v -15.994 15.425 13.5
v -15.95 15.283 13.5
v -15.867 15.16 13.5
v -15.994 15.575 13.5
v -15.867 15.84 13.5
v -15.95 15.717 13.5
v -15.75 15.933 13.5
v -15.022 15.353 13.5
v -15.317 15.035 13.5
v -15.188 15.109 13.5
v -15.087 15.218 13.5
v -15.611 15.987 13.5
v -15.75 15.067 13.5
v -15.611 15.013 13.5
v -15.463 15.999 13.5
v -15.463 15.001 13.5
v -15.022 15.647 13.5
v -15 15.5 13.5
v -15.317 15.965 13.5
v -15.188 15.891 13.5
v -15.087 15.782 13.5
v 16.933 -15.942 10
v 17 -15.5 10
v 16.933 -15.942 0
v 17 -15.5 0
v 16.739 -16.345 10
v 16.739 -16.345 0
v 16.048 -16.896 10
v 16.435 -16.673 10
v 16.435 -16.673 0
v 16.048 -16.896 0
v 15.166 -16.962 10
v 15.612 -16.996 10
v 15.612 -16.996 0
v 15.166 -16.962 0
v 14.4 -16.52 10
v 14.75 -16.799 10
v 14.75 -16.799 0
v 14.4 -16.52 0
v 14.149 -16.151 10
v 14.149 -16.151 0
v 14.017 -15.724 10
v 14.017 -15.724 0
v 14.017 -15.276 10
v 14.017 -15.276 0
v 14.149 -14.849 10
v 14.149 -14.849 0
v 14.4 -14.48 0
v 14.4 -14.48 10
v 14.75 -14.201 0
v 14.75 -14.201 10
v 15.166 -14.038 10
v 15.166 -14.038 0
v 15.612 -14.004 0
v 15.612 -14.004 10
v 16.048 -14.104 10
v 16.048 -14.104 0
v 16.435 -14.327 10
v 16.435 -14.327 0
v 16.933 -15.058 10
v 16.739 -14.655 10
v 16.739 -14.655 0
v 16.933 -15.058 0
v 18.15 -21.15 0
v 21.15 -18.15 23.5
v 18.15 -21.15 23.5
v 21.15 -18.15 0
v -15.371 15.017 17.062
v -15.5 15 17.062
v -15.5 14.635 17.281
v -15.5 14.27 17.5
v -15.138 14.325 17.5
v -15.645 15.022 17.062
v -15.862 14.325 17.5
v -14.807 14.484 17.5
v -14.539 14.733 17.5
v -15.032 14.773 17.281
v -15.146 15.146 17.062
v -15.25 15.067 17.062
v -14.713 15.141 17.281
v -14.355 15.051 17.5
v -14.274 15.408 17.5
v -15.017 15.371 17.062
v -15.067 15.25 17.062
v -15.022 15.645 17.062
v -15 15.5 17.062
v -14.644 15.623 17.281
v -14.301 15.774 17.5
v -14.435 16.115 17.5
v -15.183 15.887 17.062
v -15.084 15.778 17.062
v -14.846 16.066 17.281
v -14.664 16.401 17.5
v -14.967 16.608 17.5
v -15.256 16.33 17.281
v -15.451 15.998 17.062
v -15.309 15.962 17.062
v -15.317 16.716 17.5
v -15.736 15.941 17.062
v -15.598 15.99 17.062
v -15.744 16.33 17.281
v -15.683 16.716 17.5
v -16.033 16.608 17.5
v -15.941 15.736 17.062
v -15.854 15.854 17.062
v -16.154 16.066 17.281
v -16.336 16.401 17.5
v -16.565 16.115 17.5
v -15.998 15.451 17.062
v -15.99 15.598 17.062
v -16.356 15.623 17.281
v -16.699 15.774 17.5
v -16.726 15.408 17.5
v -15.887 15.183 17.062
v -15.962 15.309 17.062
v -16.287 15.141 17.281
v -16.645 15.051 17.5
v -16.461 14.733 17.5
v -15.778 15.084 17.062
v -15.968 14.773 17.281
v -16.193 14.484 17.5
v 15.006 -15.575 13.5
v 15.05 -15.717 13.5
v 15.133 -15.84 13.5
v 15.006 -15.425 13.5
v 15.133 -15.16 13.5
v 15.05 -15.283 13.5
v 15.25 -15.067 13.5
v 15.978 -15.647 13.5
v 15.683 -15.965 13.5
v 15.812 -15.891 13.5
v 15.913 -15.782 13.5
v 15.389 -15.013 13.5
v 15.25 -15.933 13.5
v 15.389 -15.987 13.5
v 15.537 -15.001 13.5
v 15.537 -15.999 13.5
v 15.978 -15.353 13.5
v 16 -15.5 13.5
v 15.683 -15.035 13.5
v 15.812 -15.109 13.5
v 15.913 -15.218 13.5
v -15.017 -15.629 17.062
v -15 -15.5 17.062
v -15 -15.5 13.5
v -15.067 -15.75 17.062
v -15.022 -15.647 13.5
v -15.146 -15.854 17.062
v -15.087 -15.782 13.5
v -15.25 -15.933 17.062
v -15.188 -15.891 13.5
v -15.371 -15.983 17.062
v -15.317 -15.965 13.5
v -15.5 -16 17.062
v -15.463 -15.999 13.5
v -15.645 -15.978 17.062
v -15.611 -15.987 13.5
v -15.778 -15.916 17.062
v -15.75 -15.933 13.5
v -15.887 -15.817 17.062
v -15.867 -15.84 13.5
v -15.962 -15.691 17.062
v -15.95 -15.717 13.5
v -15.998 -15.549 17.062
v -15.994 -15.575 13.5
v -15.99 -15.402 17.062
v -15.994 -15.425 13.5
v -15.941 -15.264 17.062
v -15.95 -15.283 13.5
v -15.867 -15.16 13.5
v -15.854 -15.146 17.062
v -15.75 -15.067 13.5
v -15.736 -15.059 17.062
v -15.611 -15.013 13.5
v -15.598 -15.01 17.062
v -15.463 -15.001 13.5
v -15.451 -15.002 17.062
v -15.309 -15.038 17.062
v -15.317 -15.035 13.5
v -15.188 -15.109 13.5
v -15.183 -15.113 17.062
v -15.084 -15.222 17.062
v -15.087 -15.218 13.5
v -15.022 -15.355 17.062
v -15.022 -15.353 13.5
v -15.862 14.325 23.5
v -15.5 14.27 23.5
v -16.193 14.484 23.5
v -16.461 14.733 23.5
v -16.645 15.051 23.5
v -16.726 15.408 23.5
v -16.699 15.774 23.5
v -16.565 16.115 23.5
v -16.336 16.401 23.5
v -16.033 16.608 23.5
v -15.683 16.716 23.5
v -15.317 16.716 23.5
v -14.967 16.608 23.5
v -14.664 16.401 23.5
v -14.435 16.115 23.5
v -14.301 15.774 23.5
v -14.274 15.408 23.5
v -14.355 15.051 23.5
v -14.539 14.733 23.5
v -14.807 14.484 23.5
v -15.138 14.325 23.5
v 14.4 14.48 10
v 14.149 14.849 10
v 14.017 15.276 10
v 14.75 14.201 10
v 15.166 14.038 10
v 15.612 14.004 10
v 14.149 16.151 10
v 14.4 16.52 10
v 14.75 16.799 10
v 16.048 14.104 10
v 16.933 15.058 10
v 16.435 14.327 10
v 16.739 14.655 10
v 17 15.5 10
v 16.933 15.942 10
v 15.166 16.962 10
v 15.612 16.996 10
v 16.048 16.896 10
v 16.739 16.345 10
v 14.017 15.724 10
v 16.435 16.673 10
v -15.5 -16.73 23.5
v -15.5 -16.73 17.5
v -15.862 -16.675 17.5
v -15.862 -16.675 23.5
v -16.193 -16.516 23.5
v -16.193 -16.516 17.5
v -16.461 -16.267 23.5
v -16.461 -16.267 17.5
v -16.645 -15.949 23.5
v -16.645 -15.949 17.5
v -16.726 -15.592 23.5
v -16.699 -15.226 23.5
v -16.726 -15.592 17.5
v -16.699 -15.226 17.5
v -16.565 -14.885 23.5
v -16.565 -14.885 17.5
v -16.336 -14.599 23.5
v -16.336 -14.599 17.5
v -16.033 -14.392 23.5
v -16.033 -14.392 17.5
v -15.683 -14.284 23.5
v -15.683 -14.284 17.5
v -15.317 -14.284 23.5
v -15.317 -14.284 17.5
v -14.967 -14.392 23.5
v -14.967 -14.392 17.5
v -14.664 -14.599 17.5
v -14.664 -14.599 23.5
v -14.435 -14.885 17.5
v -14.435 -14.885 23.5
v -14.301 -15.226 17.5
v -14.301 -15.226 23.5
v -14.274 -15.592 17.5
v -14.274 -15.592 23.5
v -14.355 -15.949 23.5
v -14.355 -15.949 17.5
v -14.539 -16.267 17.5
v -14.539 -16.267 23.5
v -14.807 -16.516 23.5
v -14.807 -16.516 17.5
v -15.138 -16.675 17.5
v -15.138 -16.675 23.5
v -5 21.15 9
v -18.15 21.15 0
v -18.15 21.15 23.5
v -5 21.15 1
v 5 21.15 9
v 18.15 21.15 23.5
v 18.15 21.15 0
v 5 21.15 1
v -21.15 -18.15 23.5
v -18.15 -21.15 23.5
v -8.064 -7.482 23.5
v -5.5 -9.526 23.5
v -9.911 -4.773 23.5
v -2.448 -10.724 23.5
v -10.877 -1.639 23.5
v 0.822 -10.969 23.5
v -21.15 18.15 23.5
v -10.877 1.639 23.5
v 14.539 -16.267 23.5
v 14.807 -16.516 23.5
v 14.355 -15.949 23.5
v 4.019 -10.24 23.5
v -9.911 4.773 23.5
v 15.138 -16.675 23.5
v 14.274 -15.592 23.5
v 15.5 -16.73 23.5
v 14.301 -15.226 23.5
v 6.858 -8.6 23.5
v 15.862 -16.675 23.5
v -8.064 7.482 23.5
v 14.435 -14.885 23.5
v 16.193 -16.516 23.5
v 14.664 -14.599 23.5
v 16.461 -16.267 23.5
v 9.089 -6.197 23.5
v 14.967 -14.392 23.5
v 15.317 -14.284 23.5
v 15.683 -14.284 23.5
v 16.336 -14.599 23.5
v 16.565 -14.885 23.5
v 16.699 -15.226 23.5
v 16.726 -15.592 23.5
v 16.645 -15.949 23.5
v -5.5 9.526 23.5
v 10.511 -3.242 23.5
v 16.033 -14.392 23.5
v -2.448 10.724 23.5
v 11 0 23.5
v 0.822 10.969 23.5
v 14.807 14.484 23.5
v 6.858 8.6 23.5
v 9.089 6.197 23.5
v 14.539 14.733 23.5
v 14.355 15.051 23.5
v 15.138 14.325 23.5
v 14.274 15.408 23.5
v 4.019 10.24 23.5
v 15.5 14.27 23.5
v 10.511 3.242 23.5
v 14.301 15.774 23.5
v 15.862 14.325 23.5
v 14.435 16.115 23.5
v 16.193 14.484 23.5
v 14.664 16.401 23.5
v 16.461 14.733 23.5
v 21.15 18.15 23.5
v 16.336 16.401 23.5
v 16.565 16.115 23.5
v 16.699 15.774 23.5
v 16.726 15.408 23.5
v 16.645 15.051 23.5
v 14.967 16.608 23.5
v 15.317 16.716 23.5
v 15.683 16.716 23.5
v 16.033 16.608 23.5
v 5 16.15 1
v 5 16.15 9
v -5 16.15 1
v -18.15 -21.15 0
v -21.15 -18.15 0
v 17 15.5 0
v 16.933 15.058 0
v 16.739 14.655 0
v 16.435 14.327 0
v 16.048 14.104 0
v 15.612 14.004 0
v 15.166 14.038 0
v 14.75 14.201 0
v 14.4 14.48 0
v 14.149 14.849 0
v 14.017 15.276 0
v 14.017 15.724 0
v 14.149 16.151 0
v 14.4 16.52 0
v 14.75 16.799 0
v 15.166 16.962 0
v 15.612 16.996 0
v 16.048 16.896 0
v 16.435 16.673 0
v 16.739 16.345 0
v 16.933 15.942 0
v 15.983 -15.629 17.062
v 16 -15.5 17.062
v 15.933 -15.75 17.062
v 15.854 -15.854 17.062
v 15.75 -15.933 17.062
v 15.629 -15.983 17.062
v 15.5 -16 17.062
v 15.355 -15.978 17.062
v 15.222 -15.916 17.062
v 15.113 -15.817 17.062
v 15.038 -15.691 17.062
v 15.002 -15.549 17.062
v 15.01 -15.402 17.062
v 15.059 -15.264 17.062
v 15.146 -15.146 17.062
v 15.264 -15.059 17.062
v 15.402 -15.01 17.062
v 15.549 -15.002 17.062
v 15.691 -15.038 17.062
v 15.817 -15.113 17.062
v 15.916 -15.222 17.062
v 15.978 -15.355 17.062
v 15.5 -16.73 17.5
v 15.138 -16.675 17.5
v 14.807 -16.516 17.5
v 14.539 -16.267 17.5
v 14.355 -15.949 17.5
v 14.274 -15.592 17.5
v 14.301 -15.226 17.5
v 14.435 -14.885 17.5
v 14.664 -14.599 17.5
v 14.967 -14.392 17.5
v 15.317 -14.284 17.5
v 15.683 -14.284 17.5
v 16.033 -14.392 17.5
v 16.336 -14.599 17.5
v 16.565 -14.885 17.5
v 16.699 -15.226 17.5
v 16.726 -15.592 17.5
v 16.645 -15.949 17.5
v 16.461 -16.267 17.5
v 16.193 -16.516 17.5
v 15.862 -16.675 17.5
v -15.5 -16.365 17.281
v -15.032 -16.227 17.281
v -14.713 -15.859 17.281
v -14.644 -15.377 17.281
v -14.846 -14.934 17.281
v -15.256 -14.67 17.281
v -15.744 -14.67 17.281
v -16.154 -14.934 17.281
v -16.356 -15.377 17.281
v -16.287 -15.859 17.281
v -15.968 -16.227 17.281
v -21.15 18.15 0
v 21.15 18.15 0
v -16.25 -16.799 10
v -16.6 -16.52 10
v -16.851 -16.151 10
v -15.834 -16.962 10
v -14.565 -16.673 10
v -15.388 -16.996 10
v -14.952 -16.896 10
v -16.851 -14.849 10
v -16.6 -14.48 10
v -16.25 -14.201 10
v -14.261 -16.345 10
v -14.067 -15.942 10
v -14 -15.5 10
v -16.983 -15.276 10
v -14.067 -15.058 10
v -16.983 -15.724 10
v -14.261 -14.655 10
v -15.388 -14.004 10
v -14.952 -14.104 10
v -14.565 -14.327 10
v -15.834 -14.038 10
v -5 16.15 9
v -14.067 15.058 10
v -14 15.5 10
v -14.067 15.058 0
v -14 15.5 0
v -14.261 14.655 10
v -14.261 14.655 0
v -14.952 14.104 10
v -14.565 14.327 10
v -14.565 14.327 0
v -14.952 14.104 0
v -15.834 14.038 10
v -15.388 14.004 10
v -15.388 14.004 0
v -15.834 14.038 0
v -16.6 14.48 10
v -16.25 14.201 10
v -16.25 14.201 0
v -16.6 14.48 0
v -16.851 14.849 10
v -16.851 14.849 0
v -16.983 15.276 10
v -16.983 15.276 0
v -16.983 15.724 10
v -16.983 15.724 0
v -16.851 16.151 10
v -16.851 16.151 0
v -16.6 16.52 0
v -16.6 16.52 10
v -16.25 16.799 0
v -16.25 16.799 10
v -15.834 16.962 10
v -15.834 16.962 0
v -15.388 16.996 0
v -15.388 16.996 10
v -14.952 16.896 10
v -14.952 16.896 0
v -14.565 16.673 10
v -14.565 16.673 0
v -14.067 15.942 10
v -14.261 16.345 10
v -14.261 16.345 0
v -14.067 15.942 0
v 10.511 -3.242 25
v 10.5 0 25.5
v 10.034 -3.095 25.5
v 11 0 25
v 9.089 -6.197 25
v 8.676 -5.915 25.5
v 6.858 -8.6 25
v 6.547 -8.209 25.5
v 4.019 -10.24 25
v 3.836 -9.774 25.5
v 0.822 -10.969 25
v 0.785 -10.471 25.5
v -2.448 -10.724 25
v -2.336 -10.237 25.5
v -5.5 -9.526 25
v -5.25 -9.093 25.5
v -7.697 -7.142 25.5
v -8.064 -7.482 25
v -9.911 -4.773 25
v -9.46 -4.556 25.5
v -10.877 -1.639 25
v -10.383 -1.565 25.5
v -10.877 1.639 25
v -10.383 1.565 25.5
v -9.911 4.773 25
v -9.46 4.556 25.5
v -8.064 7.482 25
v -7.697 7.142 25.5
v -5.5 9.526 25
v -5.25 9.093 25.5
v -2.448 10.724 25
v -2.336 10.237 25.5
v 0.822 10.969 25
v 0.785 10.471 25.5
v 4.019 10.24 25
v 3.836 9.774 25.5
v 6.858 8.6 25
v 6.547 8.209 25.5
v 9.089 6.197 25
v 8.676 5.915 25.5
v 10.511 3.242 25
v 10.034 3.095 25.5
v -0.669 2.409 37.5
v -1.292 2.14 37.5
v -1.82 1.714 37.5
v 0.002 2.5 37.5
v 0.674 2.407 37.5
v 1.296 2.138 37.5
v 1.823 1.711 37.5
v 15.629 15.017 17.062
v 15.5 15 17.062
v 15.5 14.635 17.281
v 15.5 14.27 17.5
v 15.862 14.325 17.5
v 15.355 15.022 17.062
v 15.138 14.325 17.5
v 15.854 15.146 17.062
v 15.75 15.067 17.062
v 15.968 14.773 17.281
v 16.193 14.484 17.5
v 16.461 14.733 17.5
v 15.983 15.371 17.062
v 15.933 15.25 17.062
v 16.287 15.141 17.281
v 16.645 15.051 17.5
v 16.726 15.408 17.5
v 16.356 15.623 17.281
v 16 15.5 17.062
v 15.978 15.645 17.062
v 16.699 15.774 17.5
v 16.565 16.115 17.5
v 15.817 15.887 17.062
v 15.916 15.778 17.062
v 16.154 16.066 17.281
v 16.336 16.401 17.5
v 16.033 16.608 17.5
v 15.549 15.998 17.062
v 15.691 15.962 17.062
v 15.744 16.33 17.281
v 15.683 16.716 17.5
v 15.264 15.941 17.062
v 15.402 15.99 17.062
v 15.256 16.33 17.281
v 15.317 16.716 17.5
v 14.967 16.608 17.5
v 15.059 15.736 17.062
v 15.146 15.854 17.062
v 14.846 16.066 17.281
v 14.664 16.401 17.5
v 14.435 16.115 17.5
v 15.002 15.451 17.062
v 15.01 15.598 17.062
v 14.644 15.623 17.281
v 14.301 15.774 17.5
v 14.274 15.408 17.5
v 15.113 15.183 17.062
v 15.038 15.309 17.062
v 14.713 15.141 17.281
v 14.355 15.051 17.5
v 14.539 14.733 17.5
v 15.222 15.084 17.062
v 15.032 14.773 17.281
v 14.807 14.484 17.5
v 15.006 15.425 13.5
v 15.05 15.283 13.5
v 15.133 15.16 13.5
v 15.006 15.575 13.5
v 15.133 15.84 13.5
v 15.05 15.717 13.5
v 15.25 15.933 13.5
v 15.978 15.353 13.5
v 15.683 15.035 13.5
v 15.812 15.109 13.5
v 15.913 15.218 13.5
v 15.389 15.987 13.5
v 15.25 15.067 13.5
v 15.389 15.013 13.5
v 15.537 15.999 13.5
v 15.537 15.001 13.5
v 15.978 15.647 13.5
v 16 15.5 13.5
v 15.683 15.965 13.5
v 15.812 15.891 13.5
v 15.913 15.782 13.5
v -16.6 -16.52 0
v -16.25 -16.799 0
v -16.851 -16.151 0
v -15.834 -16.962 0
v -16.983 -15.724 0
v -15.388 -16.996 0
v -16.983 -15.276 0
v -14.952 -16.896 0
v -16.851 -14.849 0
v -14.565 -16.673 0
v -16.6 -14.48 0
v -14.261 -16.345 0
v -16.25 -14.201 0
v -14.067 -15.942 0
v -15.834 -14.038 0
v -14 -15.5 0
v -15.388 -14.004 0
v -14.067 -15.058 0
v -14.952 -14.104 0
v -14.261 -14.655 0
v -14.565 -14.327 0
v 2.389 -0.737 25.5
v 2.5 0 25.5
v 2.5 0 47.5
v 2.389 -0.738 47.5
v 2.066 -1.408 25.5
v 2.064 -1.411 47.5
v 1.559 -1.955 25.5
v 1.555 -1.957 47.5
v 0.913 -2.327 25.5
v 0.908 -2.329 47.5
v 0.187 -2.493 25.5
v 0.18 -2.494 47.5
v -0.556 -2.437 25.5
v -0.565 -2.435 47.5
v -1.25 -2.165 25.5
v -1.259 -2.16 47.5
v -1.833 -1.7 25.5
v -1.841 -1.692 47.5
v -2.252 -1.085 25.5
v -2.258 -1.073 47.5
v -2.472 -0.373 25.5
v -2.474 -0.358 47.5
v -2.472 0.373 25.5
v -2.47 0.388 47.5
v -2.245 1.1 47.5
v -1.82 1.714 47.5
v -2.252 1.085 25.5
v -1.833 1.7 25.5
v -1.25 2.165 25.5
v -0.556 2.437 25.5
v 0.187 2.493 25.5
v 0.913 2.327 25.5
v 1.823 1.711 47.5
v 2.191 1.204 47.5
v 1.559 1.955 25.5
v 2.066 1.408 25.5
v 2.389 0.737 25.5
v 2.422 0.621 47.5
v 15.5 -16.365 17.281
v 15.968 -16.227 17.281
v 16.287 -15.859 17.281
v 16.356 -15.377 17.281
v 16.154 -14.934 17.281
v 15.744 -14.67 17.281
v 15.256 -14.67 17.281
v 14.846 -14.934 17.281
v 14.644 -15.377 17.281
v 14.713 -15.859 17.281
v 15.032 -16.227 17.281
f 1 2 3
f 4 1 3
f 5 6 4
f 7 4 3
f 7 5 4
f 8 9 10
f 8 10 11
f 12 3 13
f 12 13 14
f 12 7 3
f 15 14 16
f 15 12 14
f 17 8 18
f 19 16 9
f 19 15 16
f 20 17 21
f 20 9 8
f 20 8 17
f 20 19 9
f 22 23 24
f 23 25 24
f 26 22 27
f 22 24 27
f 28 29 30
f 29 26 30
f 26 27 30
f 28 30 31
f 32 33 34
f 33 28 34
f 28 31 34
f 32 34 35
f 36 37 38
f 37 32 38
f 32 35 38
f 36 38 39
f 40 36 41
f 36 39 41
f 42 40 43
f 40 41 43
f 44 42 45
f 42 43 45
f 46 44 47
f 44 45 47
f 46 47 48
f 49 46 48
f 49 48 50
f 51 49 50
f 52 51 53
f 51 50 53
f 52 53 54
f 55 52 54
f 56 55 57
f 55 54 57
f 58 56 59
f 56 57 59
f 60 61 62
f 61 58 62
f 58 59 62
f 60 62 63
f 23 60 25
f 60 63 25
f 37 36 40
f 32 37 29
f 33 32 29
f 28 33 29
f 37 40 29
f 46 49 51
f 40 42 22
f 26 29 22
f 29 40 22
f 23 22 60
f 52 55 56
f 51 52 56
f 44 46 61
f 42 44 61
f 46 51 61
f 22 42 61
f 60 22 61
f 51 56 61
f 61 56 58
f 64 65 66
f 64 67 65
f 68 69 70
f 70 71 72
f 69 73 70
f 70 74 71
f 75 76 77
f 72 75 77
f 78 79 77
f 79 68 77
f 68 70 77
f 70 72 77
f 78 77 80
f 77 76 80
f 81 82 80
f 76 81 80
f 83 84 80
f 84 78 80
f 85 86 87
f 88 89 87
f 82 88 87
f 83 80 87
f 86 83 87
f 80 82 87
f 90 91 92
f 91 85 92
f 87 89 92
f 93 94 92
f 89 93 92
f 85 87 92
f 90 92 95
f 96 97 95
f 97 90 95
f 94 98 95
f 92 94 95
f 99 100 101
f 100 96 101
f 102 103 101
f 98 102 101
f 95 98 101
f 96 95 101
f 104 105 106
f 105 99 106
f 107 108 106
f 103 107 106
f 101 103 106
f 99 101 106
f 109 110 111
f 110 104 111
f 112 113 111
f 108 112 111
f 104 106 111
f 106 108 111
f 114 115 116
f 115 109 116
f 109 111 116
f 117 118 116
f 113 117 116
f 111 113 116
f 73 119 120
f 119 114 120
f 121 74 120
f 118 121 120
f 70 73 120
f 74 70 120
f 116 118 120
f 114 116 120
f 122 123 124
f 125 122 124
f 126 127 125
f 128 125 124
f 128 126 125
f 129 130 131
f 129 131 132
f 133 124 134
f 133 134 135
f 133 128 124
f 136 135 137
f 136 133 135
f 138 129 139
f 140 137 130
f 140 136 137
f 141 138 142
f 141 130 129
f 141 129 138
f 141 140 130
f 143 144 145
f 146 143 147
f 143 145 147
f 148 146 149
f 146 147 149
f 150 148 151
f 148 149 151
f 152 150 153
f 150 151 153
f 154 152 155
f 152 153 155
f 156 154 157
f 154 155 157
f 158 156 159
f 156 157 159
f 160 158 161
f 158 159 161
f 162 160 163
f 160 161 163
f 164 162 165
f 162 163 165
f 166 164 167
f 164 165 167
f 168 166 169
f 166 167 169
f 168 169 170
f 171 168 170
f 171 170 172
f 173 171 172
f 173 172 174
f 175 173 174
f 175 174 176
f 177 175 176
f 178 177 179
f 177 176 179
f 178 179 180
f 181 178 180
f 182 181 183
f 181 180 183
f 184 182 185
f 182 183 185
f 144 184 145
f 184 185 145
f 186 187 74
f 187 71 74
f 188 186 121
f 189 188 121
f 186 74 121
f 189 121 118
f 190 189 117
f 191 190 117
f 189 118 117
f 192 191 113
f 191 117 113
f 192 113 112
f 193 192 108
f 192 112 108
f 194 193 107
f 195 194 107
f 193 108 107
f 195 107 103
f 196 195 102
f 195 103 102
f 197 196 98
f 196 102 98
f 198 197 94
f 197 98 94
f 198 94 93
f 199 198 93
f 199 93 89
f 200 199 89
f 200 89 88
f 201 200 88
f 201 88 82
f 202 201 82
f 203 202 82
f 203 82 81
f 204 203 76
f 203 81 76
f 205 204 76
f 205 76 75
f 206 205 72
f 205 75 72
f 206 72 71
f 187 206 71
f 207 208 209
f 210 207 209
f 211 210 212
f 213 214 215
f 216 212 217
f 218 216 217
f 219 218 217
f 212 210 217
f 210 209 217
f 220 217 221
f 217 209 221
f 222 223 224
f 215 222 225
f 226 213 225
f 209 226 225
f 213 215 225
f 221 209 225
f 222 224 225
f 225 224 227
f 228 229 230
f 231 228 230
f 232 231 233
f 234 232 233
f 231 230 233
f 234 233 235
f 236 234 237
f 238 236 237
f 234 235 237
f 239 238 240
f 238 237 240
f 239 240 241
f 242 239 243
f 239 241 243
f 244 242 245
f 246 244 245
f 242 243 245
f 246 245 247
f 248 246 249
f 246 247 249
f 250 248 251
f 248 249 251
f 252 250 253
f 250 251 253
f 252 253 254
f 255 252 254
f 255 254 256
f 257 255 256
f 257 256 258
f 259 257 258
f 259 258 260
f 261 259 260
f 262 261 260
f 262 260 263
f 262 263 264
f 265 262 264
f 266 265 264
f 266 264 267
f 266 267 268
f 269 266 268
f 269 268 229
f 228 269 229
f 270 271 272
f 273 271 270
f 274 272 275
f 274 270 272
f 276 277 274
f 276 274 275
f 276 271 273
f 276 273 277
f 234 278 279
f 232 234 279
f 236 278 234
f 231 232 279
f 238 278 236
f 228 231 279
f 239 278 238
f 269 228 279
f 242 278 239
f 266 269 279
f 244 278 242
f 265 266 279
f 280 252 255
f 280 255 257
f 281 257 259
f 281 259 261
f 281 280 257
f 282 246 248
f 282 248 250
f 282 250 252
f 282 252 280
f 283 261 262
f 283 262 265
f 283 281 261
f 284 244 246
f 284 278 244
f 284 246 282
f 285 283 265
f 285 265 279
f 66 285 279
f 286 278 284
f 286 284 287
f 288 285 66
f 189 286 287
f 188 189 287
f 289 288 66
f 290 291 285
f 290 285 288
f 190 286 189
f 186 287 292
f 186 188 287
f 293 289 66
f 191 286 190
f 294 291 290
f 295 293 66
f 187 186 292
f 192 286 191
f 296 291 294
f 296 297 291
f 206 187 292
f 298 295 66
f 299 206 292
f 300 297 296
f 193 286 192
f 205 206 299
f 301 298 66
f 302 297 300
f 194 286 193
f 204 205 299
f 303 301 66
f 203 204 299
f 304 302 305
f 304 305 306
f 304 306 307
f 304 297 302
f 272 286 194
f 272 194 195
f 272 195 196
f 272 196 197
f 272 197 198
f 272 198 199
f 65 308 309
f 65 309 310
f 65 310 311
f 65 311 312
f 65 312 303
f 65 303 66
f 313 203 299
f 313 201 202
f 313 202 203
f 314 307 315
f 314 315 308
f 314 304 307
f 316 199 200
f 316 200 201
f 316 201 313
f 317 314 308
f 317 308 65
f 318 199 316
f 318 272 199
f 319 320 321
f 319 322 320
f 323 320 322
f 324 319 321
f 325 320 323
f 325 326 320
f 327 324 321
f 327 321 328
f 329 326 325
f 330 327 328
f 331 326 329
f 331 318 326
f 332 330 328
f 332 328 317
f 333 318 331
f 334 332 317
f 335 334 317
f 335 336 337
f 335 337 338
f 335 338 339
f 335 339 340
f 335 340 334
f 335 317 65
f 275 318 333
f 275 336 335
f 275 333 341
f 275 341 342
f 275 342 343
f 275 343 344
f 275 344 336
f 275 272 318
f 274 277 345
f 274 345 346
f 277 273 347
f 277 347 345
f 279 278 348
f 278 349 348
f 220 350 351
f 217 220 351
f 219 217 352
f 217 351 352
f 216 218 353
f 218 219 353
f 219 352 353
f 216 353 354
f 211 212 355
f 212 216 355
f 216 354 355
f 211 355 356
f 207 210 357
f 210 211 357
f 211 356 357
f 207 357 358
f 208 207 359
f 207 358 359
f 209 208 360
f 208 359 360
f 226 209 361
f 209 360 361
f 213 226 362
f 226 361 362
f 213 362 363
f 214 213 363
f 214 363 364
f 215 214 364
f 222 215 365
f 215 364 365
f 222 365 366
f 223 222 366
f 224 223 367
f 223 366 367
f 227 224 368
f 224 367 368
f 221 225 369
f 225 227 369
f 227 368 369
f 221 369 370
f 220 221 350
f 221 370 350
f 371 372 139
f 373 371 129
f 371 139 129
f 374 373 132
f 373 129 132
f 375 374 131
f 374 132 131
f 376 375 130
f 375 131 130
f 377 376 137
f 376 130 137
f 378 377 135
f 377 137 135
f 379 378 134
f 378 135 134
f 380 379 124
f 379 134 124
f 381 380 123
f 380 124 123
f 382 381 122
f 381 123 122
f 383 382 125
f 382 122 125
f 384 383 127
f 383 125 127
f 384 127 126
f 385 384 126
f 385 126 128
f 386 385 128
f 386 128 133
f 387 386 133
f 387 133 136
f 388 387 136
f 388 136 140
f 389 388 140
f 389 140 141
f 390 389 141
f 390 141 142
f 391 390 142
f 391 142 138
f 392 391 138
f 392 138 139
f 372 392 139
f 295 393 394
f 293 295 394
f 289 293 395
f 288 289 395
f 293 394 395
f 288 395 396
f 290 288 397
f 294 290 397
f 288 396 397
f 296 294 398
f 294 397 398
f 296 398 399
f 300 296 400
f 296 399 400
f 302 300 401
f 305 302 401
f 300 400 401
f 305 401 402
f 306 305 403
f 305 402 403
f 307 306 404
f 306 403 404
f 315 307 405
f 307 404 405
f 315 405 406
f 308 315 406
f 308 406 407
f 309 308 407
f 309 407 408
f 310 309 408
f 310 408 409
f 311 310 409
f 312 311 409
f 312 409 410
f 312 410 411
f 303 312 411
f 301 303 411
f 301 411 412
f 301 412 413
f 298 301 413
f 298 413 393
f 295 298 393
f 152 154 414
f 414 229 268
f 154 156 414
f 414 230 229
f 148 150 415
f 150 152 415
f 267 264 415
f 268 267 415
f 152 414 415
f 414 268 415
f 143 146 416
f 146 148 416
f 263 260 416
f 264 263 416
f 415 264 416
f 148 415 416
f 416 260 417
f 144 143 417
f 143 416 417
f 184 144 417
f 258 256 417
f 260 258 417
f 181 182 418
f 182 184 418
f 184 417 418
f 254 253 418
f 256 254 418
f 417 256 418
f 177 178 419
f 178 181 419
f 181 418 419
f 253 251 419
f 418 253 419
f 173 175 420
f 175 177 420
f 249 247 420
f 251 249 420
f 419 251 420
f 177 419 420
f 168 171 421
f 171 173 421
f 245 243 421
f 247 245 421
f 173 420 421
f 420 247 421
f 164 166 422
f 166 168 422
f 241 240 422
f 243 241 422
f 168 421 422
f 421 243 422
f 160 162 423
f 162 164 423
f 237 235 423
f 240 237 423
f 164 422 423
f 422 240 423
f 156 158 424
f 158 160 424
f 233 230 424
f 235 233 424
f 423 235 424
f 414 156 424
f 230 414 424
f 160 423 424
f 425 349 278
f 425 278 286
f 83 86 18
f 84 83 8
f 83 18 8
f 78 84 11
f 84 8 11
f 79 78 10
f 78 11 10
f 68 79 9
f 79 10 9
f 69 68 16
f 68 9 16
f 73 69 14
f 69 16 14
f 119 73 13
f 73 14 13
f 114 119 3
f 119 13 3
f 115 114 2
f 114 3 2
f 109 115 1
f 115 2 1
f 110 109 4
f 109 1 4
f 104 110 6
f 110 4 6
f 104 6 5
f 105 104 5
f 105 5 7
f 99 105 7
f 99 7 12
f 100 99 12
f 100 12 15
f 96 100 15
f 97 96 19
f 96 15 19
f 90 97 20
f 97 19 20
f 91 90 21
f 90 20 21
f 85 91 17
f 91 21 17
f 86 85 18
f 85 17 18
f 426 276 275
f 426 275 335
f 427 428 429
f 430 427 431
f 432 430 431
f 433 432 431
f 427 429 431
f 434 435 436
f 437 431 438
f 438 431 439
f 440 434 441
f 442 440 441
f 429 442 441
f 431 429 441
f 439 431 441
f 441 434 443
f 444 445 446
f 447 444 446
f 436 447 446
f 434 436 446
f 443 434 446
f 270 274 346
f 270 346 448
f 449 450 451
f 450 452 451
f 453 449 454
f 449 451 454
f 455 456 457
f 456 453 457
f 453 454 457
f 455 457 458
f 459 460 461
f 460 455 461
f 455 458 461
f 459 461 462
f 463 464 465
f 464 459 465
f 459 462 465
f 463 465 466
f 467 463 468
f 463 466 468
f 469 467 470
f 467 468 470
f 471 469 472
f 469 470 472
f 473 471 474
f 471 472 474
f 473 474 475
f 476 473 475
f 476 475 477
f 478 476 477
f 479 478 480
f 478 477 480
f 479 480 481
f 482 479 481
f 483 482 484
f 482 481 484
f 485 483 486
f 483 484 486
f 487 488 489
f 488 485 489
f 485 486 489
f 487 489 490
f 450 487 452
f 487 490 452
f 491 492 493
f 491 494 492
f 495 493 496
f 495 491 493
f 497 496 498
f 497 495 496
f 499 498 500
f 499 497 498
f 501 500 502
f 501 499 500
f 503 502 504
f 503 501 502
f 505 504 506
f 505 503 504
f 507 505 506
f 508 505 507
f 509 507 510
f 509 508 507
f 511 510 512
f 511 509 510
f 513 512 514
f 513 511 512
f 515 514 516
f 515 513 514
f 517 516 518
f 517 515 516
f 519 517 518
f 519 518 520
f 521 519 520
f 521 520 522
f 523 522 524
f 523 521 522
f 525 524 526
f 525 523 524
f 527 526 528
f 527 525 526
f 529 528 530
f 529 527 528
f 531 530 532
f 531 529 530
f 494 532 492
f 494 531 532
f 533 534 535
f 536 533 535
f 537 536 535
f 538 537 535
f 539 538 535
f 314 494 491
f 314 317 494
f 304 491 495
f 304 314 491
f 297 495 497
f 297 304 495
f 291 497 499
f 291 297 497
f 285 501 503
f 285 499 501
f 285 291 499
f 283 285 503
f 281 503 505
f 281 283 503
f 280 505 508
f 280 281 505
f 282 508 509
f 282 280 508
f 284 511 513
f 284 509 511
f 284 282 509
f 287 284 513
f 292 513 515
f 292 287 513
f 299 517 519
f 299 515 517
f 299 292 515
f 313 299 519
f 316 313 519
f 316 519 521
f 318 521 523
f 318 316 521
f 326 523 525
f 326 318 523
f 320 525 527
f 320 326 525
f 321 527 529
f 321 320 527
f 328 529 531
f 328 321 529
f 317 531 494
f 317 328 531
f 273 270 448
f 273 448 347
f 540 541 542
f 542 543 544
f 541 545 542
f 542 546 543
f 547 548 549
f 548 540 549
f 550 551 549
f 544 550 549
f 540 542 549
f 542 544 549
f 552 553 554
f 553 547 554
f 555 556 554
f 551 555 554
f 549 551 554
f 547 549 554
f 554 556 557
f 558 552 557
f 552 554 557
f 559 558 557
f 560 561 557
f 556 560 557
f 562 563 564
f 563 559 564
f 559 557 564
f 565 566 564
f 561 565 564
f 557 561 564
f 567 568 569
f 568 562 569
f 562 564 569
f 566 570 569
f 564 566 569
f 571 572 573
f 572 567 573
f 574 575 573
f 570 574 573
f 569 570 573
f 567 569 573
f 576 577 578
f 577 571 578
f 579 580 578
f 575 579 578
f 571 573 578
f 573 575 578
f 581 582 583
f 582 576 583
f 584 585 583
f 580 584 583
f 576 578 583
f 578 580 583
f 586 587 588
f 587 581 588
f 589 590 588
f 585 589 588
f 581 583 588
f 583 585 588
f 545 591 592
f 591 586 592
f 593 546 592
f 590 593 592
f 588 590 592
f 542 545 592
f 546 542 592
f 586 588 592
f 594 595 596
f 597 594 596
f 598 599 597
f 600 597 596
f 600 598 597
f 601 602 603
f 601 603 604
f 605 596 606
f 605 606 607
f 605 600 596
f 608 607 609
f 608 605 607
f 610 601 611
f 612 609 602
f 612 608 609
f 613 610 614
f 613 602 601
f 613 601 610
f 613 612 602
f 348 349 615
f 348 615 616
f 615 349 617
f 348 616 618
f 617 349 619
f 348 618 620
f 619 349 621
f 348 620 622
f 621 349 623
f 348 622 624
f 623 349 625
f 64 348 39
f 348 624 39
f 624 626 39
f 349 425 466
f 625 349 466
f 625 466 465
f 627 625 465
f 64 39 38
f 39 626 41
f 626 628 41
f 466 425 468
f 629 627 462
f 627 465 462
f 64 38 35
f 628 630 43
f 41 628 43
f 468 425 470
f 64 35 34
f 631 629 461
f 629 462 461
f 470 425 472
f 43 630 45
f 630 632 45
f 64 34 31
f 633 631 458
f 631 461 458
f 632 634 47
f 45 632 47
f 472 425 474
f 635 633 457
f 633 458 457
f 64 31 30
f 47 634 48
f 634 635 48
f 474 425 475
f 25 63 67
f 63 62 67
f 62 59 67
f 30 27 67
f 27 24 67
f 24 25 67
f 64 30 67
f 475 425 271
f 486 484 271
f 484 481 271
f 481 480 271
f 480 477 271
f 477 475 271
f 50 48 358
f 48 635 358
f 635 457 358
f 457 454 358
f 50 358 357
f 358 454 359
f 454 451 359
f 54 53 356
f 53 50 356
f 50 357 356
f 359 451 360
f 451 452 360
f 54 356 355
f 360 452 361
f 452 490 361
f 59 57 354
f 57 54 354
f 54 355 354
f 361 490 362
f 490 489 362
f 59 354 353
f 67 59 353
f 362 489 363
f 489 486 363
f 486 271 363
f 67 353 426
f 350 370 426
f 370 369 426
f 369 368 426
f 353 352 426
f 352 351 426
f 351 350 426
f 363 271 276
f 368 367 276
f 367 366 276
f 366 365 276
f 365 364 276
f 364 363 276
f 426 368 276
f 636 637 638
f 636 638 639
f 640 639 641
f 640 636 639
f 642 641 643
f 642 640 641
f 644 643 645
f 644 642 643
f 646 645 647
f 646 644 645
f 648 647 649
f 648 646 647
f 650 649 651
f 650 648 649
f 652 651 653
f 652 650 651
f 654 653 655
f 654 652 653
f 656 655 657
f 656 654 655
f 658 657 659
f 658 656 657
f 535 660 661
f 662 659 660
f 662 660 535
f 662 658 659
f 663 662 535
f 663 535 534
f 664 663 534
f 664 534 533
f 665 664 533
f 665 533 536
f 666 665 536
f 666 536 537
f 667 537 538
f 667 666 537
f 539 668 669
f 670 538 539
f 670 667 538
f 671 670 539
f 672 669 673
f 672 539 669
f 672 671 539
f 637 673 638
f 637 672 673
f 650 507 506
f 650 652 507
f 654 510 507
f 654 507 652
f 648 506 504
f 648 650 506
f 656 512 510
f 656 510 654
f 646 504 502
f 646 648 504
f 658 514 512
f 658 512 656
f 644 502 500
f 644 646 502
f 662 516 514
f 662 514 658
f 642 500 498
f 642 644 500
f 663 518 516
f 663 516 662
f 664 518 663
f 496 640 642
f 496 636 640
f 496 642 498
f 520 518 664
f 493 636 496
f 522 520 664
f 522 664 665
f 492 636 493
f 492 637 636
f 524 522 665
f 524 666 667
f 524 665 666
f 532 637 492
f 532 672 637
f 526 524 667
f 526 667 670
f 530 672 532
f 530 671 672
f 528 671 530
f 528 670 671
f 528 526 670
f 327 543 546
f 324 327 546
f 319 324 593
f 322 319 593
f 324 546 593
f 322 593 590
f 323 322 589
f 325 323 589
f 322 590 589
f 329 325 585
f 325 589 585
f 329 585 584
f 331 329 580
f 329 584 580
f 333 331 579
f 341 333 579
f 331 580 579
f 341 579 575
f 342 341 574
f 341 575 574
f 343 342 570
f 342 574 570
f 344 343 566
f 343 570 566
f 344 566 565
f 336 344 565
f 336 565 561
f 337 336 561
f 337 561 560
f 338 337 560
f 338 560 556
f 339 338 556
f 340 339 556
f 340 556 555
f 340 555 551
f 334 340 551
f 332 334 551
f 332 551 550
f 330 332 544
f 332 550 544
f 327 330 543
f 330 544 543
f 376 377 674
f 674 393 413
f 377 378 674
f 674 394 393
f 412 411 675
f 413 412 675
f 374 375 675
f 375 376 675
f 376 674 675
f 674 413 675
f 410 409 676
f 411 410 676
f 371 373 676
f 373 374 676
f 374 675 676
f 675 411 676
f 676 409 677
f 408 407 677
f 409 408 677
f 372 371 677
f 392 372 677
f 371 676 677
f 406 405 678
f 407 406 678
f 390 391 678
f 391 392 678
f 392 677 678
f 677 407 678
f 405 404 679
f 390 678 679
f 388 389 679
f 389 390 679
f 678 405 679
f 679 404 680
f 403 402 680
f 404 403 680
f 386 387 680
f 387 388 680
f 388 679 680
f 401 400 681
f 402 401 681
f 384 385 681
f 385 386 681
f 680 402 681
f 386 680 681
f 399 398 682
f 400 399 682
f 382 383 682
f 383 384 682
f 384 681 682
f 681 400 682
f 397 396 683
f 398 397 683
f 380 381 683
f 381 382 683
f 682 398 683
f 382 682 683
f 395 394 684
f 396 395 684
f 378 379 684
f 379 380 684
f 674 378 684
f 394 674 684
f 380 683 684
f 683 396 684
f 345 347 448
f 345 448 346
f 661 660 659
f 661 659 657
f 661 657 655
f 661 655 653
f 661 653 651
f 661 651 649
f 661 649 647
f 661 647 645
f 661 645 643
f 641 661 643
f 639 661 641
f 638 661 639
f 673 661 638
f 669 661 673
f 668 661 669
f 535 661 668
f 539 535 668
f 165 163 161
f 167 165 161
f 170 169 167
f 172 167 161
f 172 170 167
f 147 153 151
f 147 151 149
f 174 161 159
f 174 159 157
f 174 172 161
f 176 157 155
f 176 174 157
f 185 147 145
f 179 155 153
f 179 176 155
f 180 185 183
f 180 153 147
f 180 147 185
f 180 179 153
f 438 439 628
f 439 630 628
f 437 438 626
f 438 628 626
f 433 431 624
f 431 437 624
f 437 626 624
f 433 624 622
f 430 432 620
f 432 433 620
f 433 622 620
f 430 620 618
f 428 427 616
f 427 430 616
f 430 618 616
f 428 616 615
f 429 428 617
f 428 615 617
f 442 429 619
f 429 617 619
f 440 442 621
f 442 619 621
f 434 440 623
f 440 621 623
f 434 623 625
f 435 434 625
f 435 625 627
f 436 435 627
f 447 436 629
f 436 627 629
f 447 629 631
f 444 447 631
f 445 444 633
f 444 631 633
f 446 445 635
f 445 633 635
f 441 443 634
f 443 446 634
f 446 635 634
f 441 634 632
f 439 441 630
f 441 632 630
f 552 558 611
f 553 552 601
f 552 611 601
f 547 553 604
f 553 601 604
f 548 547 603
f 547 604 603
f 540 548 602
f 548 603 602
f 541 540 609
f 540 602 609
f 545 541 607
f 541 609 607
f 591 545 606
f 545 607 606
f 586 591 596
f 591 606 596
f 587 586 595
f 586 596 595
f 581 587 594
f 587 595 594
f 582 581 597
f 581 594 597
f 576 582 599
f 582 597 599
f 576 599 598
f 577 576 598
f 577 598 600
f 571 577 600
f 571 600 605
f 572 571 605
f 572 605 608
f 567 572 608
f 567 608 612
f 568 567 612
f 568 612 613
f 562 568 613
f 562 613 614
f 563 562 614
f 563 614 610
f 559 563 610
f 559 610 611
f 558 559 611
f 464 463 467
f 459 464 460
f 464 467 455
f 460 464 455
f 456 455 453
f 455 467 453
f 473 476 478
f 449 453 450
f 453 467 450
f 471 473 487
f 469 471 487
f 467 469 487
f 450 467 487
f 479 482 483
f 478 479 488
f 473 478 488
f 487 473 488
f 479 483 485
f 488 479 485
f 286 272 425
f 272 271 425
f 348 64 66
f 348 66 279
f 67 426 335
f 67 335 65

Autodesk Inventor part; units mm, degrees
ref_plane "YZ Plane" through (0, 0, 0) normal (1, 0, 0) x (0, 1, 0)
ref_plane "XZ Plane" through (0, 0, 0) normal (0, 1, 0) x (-1, 0, 0)
ref_plane "XY Plane" through (0, 0, 0) normal (0, 0, 1) x (1, 0, 0)
sketch "Sketch1" plane through (0, 0, 0) normal (0, 0, 1) x (1, 0, 0)
  line L0 (-18.15, 21.15) -> (18.15, 21.15)
  line L1 (21.15, 18.15) -> (21.15, -18.15)
  line L2 (18.15, -21.15) -> (-18.15, -21.15)
  line L3 (-21.15, -18.15) -> (-21.15, 18.15)
  line L4 (-21.15, 21.15) -> (21.15, -21.15) construction
  line L5 (21.15, 21.15) -> (-21.15, -21.15) construction
  line L6 (18.15, 21.15) -> (21.15, 18.15)
  line L7 (-18.15, 21.15) -> (-21.15, 18.15)
  line L8 (-21.15, -18.15) -> (-18.15, -21.15)
  line L9 (18.15, -21.15) -> (21.15, -18.15)
  line L10 (-15.5, 15.5) -> (15.5, 15.5) construction
  line L11 (15.5, 15.5) -> (15.5, -15.5) construction
  line L12 (15.5, -15.5) -> (-15.5, -15.5) construction
  line L13 (-15.5, -15.5) -> (-15.5, 15.5) construction
  line L14 (-15.5, 15.5) -> (15.5, -15.5) construction
  line L15 (15.5, 15.5) -> (-15.5, -15.5) construction
  circle A0 centre (-15.5, 15.5) radius 1.5
  circle A1 centre (15.5, 15.5) radius 1.5
  circle A2 centre (15.5, -15.5) radius 1.5
  circle A3 centre (-15.5, -15.5) radius 1.5
  point P0 (0, 0)
  dimension "d0" = 42.3
  dimension "d1" = 42.3
  dimension "d2" = 3
  dimension "d3" = 3
  dimension "d4" = 3
  dimension "d5" = 3
  dimension "d6" = 3
  dimension "d7" = 3
  dimension "d8" = 3
  dimension "d9" = 3
  dimension "d10" = 31
  dimension "d11" = 31
  dimension "d12" = 3
  dimension "d13" = 3
  dimension "d14" = 3
  dimension "d15" = 3
extrude "Extrusion1" add sketch "Sketch1" along normal blind 10
sketch "Sketch2" plane through (0, 0, 10) normal (0, 0, 1) x (1, 0, 0)
  line L0 (-18.15, 21.15) -> (18.15, 21.15)
  line L1 (21.15, 18.15) -> (21.15, -18.15)
  line L2 (18.15, -21.15) -> (-18.15, -21.15)
  line L3 (-21.15, -18.15) -> (-21.15, 18.15)
  line L4 (-21.15, 21.15) -> (21.15, -21.15) construction
  line L5 (21.15, 21.15) -> (-21.15, -21.15) construction
  line L6 (-18.15, 21.15) -> (-21.15, 18.15)
  line L7 (-21.15, -18.15) -> (-18.15, -21.15)
  line L8 (21.15, -18.15) -> (18.15, -21.15)
  line L9 (18.15, 21.15) -> (21.15, 18.15)
  point P0 (0, 0)
  dimension "d18" = 42.3
  dimension "d19" = 42.3
  dimension "d20" = 3
  dimension "d21" = 3
  dimension "d22" = 3
  dimension "d23" = 3
  dimension "d24" = 3
  dimension "d25" = 3
  dimension "d26" = 3
  dimension "d27" = 3
extrude "Extrusion2" add sketch "Sketch2" along normal blind 3.5
sketch "Sketch3" plane through (0, 0, 13.5) normal (0, 0, 1) x (1, 0, 0)
  line L0 (-18.15, 21.15) -> (18.15, 21.15)
  line L1 (21.15, 18.15) -> (21.15, -18.15)
  line L2 (18.15, -21.15) -> (-18.15, -21.15)
  line L3 (-21.15, -18.15) -> (-21.15, 18.15)
  line L4 (-21.15, 21.15) -> (21.15, -21.15) construction
  line L5 (21.15, 21.15) -> (-21.15, -21.15) construction
  line L6 (-18.15, 21.15) -> (-21.15, 18.15)
  line L7 (-21.15, -18.15) -> (-18.15, -21.15)
  line L8 (21.15, -18.15) -> (18.15, -21.15)
  line L9 (18.15, 21.15) -> (21.15, 18.15)
  line L10 (-15.5, 15.5) -> (15.5, 15.5) construction
  line L11 (15.5, 15.5) -> (15.5, -15.5) construction
  line L12 (15.5, -15.5) -> (-15.5, -15.5) construction
  line L13 (-15.5, -15.5) -> (-15.5, 15.5) construction
  line L14 (-15.5, 15.5) -> (15.5, -15.5) construction
  line L15 (15.5, 15.5) -> (-15.5, -15.5) construction
  circle A0 centre (-15.5, 15.5) radius 0.5
  circle A1 centre (-15.5, -15.5) radius 0.5
  circle A2 centre (15.5, -15.5) radius 0.5
  circle A3 centre (15.5, 15.5) radius 0.5
  point P0 (0, 0)
  dimension "d30" = 42.3
  dimension "d31" = 42.3
  dimension "d32" = 3
  dimension "d33" = 3
  dimension "d34" = 3
  dimension "d35" = 3
  dimension "d36" = 3
  dimension "d37" = 3
  dimension "d38" = 3
  dimension "d39" = 3
  dimension "d40" = 31
  dimension "d41" = 31
  dimension "d42" = 1
  dimension "d43" = 1
  dimension "d44" = 1
  dimension "d45" = 1
extrude "Extrusion3" add sketch "Sketch3" along normal blind 10
sketch "Sketch4" plane through (0, 0, 23.5) normal (0, 0, 1) x (1, 0, 0)
  circle A0 centre (0, 0) radius 11
  dimension "d48" = 22
extrude "Extrusion4" add sketch "Sketch4" along normal blind 2
chamfer "Chamfer1" distance 0.5 angle 45 1 edges at (-11, 0, 25.5)
sketch "Sketch5" plane through (0, 0, 25.5) normal (0, 0, 1) x (1, 0, 0)
  circle A0 centre (0, 0) radius 10.5 projected
  circle A1 centre (0, 0) radius 2.5
  dimension "d54" = 5
extrude "Extrusion5" add sketch "Sketch5" along normal blind 22 contours A1
sketch "Sketch6" plane through (-18.15, 21.15, 0) normal (0, 1, 0) x (1, 0, 0)
  line L0 (0, 0) -> (36.3, 0) projected
  line L1 (13.15, -1) -> (23.15, -1)
  line L2 (23.15, -1) -> (23.15, -9)
  line L3 (23.15, -9) -> (13.15, -9)
  line L4 (13.15, -9) -> (13.15, -1)
  line L5 (13.15, -1) -> (23.15, -9) construction
  line L6 (23.15, -1) -> (13.15, -9) construction
  point P0 (18.15, 0)
  point P1 (18.15, -5)
  dimension "d57" = 10
  dimension "d58" = 8
  dimension "d59" = 0
  dimension "d60" = 5
extrude "Extrusion6" cut sketch "Sketch6" against normal blind 5
sketch "Sketch7" plane through (0, 0, 47.5) normal (0, 0, 1) x (1, 0, 0)
  circle A0 centre (0, 0) radius 2.5 projected
  arc A1 (1.8231, 1.7107) -> (-1.8197, 1.7142) centre (0, 0) ccw
  line L0 (-1.8197, 1.7142) -> (1.8231, 1.7107)
  dimension "d63" = 3.6428
extrude "Extrusion7" cut sketch "Sketch7" against normal blind 10 contours L0 A0 picked at (0.4606, 1.8369)
sketch "Esboço10" plane through (0, 0, 23.5) normal (0, 0, 1) x (1, 0, 0)
  circle A0 centre (15.5, 15.5) radius 0.5 projected
  circle A1 centre (15.5, -15.5) radius 0.5 projected
  circle A2 centre (-15.5, -15.5) radius 0.5 projected
  circle A3 centre (-15.5, 15.5) radius 0.5 projected
hole "Furo1" at (-15.5, 15.5, 23.5) at (15.5, 15.5, 23.5) at (15.5, -15.5, 23.5) at (-15.5, -15.5, 23.5) direction (0, 0, -1) diameter 2.459 depth 6 tip angle 118 thread size "M3x0.5" class "6H" standard "ANSI Metric M Profile"
sketch "Sketch9" plane through (0, 0, 0) normal (0, 0, -1) x (-1, 0, 0)
  circle A0 centre (0, 0) radius 2.5
  dimension "d68" = 5
equation "\"d3\" = d2"
equation "\"d4\" = d2"
equation "\"d5\" = d4"
equation "\"d6\" = d2"
equation "\"d7\" = d6"
equation "\"d8\" = d2"
equation "\"d9\" = d8"
equation "\"d21\" = d20"
equation "\"d23\" = d22"
equation "\"d24\" = d22"
equation "\"d25\" = d24"
equation "\"d26\" = d22"
equation "\"d27\" = d26"
equation "\"d33\" = d32"
equation "\"d34\" = d32"
equation "\"d35\" = d34"
equation "\"d36\" = d32"
equation "\"d37\" = d36"
equation "\"d38\" = d32"
equation "\"d39\" = d38"
properties part number "KTC-5017-010" material "Steel, Carbon"
